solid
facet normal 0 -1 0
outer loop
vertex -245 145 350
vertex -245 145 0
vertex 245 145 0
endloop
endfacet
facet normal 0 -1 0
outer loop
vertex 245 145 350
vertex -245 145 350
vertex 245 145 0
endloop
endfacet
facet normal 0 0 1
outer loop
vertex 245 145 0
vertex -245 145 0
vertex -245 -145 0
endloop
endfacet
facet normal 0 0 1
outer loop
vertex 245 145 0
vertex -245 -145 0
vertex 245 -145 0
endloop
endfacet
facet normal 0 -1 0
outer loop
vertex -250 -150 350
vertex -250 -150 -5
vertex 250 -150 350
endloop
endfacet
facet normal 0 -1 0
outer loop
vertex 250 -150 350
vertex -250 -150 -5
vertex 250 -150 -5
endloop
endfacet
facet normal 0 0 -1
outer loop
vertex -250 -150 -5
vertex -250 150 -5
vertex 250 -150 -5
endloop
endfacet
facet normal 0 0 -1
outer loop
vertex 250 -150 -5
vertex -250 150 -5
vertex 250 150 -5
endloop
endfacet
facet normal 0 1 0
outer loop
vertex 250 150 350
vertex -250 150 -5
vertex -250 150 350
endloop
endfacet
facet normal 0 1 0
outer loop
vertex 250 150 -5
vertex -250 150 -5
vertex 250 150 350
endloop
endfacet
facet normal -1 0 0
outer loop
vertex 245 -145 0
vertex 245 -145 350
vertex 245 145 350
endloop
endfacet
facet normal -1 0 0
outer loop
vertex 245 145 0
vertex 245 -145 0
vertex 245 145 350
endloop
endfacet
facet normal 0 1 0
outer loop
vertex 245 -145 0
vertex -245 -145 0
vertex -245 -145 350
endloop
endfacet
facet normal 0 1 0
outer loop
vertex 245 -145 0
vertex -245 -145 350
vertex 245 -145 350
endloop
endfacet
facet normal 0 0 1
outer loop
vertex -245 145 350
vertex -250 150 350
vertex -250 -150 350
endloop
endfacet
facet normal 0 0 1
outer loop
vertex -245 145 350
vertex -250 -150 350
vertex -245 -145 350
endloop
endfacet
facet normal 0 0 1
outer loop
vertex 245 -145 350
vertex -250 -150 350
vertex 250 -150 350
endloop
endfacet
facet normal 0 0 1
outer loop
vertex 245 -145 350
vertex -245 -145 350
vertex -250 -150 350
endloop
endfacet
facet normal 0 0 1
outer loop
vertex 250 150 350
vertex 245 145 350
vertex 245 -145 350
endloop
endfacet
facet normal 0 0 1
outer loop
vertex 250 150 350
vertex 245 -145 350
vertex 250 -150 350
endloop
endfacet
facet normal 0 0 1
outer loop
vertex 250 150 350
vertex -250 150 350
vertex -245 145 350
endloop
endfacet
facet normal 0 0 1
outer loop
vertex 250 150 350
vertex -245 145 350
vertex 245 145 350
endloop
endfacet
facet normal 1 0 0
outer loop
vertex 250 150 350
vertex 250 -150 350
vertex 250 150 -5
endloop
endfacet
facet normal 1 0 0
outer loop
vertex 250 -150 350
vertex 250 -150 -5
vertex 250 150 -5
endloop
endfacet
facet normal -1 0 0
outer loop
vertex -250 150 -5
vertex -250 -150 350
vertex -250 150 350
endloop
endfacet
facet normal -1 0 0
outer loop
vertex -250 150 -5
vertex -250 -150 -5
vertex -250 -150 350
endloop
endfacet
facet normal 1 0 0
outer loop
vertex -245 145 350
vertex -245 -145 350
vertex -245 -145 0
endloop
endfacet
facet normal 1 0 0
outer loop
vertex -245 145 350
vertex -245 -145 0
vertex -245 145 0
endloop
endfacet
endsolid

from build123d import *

# Parameters (mm, degrees)
F0_W     = 500
F0_H     = 300
F0_W_2   = 489.9999916553
F0_H_2   = 289.9999916553
F1_DEPTH = 5
F2_DEPTH = 350


with BuildPart() as f1:
    # F0 (on Top) → F1 (new body)
    with BuildSketch(Plane.XY):
        Rectangle(F0_W, F0_H)
        Rectangle(F0_W_2, F0_H_2, mode=Mode.SUBTRACT)
        Rectangle(F0_W_2, F0_H_2)
    extrude(amount=-F1_DEPTH)

    # F0 (on Top) → F2 (join)
    with BuildSketch(Plane.XY):
        Rectangle(F0_W, F0_H)
        Rectangle(F0_W_2, F0_H_2, mode=Mode.SUBTRACT)
    extrude(amount=F2_DEPTH)


solid = f1.part
